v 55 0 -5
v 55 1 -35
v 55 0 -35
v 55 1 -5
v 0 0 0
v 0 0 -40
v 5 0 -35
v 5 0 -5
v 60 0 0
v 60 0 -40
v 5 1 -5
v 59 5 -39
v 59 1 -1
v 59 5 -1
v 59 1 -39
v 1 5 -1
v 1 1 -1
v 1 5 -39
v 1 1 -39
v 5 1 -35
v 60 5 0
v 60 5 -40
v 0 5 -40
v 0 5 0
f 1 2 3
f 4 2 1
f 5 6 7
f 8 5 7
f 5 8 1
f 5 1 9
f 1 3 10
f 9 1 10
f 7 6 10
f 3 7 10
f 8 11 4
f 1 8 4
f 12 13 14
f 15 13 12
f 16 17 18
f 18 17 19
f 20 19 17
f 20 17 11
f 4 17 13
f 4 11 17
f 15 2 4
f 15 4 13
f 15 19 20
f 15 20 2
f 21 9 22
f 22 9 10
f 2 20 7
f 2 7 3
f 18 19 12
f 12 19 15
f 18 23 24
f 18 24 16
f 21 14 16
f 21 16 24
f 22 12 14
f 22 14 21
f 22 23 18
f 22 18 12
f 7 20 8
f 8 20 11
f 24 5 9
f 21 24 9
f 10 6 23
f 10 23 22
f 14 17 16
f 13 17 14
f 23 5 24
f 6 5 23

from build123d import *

# Parameters (mm, degrees)
SKETCH3_W               = 60
SKETCH3_H               = 40
BOSS_EXTRUDE1_DEPTH     = 5
CUT_EXTRUDE1_DEPTH      = 73.284161474
CUT_EXTRUDE1_DEPTH_BACK = 73.284161474
SKETCH6_W               = 58
SKETCH6_H               = 38
SKETCH7_W               = 60
SKETCH7_H               = 40
BOSS_EXTRUDE2_DEPTH     = 1
CUT_EXTRUDE2_DEPTH      = 73.284161474
CUT_EXTRUDE2_DEPTH_BACK = 73.284161474
SKETCH8_W               = 50
SKETCH8_H               = 30


with BuildPart() as part:
    # Sketch3 → Boss-Extrude1 (new body)
    with BuildSketch(Plane(origin=(0, 0, 0), x_dir=(1, 0, 0), z_dir=(0, 1, 0))):
        with Locations((30, 20)):
            Rectangle(SKETCH3_W, SKETCH3_H)
    extrude(amount=BOSS_EXTRUDE1_DEPTH)

    # Sketch6 → Cut-Extrude1 (cut, two sides: drawn at the far end of the back side and taken through both)
    with BuildSketch(Plane(origin=(0, 0, 0), x_dir=(1, 0, 0), z_dir=(0, 1, 0)).offset(-CUT_EXTRUDE1_DEPTH_BACK)):
        with Locations((30, 20)):
            Rectangle(SKETCH6_W, SKETCH6_H)
    extrude(amount=CUT_EXTRUDE1_DEPTH + CUT_EXTRUDE1_DEPTH_BACK, mode=Mode.SUBTRACT)

    # Sketch7 → Boss-Extrude2 (add)
    with BuildSketch(Plane(origin=(0, 0, 0), x_dir=(1, 0, 0), z_dir=(0, 1, 0))):
        with Locations((30, 20)):
            Rectangle(SKETCH7_W, SKETCH7_H)
    extrude(amount=BOSS_EXTRUDE2_DEPTH)

    # Sketch8 → Cut-Extrude2 (cut, two sides: drawn at the far end of the back side and taken through both)
    with BuildSketch(Plane.XZ.offset(-CUT_EXTRUDE2_DEPTH_BACK)):
        with Locations((30, -20)):
            Rectangle(SKETCH8_W, SKETCH8_H)
    extrude(amount=CUT_EXTRUDE2_DEPTH + CUT_EXTRUDE2_DEPTH_BACK, mode=Mode.SUBTRACT)


solid = part.part
